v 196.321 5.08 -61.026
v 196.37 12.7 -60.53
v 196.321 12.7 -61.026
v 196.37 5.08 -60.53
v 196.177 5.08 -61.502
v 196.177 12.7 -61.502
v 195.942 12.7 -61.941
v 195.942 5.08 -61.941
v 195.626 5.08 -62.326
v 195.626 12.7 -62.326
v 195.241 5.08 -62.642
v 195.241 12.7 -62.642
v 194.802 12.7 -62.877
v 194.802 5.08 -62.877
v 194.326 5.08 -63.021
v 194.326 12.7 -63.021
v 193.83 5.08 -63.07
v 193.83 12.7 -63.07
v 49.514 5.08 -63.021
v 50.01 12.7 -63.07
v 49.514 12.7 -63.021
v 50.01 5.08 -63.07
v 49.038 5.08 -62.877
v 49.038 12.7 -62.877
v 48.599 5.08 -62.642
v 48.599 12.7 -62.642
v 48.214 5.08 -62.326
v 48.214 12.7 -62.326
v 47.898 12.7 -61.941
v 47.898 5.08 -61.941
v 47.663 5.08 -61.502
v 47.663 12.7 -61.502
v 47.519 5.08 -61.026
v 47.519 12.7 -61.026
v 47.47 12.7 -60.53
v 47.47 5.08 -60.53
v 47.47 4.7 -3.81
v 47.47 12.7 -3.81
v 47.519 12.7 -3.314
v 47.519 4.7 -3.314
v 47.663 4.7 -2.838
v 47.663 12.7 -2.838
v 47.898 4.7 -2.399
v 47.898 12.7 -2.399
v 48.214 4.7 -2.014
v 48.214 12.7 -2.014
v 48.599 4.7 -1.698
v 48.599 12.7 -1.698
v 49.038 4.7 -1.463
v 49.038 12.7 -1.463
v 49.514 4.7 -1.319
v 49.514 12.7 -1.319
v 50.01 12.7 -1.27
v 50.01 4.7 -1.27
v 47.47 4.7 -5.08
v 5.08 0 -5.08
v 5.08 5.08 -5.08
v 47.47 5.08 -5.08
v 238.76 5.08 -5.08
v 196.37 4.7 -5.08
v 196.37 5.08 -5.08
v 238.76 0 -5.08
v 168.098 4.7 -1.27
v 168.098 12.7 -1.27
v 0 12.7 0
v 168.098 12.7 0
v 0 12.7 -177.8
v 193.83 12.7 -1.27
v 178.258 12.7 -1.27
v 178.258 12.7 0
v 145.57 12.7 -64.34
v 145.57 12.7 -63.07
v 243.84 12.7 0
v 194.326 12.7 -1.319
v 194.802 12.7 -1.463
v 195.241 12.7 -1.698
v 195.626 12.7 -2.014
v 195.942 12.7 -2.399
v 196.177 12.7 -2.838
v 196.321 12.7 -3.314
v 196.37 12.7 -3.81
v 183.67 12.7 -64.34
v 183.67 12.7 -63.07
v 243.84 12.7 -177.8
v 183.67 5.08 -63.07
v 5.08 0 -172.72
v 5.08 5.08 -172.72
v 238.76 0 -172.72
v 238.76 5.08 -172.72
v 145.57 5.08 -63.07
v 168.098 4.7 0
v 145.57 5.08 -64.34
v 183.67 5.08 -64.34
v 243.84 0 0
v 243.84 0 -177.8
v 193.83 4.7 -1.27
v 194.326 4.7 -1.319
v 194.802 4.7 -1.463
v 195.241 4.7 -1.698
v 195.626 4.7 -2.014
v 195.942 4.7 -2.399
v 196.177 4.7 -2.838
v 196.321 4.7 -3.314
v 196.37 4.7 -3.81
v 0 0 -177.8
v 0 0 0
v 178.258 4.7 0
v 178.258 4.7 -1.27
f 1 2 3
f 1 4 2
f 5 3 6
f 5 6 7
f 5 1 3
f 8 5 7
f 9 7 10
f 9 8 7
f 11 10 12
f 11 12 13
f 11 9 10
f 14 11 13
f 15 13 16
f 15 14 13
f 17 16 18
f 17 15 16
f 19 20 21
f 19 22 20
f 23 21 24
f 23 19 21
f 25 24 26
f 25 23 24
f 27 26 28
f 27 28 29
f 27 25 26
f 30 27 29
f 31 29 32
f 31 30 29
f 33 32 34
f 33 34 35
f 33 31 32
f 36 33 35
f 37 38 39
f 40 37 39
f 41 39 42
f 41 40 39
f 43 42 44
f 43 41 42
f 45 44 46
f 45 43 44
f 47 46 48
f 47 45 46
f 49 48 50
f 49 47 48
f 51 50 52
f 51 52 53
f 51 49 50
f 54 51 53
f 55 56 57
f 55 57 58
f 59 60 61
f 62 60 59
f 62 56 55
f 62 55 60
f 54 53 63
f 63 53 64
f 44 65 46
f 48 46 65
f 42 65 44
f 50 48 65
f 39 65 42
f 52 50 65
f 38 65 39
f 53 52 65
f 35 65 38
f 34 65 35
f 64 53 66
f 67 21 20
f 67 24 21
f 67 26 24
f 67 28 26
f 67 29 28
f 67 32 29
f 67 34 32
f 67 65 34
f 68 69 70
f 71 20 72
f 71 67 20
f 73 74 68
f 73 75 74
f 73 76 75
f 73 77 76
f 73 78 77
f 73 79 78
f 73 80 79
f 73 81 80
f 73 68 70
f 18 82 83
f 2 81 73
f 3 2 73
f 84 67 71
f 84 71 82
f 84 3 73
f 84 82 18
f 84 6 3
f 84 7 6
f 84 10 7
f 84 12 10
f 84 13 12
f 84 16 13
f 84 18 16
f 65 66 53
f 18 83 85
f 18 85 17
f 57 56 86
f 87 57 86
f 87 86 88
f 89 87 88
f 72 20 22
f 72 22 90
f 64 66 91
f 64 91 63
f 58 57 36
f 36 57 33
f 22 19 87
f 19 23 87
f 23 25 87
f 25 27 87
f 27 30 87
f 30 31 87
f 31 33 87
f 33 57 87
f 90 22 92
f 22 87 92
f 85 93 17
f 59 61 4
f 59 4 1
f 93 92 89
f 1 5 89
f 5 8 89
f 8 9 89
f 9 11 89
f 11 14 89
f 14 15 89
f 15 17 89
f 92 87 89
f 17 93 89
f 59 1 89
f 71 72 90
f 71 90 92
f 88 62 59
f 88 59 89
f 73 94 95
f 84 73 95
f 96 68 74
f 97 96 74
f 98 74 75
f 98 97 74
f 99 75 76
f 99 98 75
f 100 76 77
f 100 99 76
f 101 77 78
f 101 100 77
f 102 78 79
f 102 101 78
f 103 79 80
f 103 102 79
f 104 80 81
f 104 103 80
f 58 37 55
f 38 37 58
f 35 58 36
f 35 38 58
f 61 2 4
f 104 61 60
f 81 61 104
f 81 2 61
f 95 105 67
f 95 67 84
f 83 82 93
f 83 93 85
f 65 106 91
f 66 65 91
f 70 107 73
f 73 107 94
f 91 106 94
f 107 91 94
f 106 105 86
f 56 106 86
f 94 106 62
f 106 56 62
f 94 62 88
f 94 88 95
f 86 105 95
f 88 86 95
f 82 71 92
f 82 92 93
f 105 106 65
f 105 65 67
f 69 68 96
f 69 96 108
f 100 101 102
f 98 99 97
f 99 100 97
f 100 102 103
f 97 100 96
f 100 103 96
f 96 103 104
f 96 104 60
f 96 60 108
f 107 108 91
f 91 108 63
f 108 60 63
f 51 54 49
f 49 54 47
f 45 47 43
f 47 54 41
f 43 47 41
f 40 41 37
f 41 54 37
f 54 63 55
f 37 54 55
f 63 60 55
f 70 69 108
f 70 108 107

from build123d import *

# Parameters (mm, degrees)
SKETCH1_W           = 243.84
SKETCH1_H           = 177.8
SKETCH1_W_2         = 233.68
SKETCH1_H_2         = 167.64
BOSS_EXTRUDE7_DEPTH = 12.7
SKETCH6_W           = 233.68
SKETCH6_H           = 167.64
BOSS_EXTRUDE8_DEPTH = 7.62
CUT_EXTRUDE2_DEPTH  = 8
FILLET1_R           = 2.54


with BuildPart() as part:
    # Sketch1 → Boss-Extrude7 (new body)
    with BuildSketch(Plane(origin=(0, 0, 0), x_dir=(1, 0, 0), z_dir=(0, 1, 0))):
        with Locations((121.92, 88.9)):
            Rectangle(SKETCH1_W, SKETCH1_H)
        with Locations((121.92, 88.9)):
            Rectangle(SKETCH1_W_2, SKETCH1_H_2, mode=Mode.SUBTRACT)
    extrude(amount=BOSS_EXTRUDE7_DEPTH)

    # Sketch6 → Boss-Extrude8 (add)
    with BuildSketch(Plane(origin=(0, 12.7, 0), x_dir=(1, 0, 0), z_dir=(0, 1, 0))):
        with Locations((121.92, 88.9)):
            Rectangle(SKETCH6_W, SKETCH6_H)
    extrude(amount=-BOSS_EXTRUDE8_DEPTH)

    # Sketch7 → Cut-Extrude2 (cut)
    with BuildSketch(Plane(origin=(0, 12.7, 0), x_dir=(1, 0, 0), z_dir=(0, 1, 0))):
        Polygon((196.37, 1.27), (178.258137899, 1.27), (178.258137899, 0), (168.098137899, 0), (168.098137899, 1.27), (157.995367116, 1.27), (47.47, 1.27), (47.47, 63.07), (145.57, 63.07), (145.57, 64.34), (183.67, 64.34), (183.67, 63.07), (196.37, 63.07), align=None)
    extrude(amount=-CUT_EXTRUDE2_DEPTH, mode=Mode.SUBTRACT)

    # Fillet1
    fillet1_edges = [part.edges().sort_by_distance(p)[0] for p in [
        (47.47, 8.89, -63.07),
        (47.47, 8.7, -1.27),
        (196.37, 8.89, -63.07),
        (196.37, 8.7, -1.27),
    ]]
    fillet(fillet1_edges, radius=FILLET1_R)


solid = part.part
